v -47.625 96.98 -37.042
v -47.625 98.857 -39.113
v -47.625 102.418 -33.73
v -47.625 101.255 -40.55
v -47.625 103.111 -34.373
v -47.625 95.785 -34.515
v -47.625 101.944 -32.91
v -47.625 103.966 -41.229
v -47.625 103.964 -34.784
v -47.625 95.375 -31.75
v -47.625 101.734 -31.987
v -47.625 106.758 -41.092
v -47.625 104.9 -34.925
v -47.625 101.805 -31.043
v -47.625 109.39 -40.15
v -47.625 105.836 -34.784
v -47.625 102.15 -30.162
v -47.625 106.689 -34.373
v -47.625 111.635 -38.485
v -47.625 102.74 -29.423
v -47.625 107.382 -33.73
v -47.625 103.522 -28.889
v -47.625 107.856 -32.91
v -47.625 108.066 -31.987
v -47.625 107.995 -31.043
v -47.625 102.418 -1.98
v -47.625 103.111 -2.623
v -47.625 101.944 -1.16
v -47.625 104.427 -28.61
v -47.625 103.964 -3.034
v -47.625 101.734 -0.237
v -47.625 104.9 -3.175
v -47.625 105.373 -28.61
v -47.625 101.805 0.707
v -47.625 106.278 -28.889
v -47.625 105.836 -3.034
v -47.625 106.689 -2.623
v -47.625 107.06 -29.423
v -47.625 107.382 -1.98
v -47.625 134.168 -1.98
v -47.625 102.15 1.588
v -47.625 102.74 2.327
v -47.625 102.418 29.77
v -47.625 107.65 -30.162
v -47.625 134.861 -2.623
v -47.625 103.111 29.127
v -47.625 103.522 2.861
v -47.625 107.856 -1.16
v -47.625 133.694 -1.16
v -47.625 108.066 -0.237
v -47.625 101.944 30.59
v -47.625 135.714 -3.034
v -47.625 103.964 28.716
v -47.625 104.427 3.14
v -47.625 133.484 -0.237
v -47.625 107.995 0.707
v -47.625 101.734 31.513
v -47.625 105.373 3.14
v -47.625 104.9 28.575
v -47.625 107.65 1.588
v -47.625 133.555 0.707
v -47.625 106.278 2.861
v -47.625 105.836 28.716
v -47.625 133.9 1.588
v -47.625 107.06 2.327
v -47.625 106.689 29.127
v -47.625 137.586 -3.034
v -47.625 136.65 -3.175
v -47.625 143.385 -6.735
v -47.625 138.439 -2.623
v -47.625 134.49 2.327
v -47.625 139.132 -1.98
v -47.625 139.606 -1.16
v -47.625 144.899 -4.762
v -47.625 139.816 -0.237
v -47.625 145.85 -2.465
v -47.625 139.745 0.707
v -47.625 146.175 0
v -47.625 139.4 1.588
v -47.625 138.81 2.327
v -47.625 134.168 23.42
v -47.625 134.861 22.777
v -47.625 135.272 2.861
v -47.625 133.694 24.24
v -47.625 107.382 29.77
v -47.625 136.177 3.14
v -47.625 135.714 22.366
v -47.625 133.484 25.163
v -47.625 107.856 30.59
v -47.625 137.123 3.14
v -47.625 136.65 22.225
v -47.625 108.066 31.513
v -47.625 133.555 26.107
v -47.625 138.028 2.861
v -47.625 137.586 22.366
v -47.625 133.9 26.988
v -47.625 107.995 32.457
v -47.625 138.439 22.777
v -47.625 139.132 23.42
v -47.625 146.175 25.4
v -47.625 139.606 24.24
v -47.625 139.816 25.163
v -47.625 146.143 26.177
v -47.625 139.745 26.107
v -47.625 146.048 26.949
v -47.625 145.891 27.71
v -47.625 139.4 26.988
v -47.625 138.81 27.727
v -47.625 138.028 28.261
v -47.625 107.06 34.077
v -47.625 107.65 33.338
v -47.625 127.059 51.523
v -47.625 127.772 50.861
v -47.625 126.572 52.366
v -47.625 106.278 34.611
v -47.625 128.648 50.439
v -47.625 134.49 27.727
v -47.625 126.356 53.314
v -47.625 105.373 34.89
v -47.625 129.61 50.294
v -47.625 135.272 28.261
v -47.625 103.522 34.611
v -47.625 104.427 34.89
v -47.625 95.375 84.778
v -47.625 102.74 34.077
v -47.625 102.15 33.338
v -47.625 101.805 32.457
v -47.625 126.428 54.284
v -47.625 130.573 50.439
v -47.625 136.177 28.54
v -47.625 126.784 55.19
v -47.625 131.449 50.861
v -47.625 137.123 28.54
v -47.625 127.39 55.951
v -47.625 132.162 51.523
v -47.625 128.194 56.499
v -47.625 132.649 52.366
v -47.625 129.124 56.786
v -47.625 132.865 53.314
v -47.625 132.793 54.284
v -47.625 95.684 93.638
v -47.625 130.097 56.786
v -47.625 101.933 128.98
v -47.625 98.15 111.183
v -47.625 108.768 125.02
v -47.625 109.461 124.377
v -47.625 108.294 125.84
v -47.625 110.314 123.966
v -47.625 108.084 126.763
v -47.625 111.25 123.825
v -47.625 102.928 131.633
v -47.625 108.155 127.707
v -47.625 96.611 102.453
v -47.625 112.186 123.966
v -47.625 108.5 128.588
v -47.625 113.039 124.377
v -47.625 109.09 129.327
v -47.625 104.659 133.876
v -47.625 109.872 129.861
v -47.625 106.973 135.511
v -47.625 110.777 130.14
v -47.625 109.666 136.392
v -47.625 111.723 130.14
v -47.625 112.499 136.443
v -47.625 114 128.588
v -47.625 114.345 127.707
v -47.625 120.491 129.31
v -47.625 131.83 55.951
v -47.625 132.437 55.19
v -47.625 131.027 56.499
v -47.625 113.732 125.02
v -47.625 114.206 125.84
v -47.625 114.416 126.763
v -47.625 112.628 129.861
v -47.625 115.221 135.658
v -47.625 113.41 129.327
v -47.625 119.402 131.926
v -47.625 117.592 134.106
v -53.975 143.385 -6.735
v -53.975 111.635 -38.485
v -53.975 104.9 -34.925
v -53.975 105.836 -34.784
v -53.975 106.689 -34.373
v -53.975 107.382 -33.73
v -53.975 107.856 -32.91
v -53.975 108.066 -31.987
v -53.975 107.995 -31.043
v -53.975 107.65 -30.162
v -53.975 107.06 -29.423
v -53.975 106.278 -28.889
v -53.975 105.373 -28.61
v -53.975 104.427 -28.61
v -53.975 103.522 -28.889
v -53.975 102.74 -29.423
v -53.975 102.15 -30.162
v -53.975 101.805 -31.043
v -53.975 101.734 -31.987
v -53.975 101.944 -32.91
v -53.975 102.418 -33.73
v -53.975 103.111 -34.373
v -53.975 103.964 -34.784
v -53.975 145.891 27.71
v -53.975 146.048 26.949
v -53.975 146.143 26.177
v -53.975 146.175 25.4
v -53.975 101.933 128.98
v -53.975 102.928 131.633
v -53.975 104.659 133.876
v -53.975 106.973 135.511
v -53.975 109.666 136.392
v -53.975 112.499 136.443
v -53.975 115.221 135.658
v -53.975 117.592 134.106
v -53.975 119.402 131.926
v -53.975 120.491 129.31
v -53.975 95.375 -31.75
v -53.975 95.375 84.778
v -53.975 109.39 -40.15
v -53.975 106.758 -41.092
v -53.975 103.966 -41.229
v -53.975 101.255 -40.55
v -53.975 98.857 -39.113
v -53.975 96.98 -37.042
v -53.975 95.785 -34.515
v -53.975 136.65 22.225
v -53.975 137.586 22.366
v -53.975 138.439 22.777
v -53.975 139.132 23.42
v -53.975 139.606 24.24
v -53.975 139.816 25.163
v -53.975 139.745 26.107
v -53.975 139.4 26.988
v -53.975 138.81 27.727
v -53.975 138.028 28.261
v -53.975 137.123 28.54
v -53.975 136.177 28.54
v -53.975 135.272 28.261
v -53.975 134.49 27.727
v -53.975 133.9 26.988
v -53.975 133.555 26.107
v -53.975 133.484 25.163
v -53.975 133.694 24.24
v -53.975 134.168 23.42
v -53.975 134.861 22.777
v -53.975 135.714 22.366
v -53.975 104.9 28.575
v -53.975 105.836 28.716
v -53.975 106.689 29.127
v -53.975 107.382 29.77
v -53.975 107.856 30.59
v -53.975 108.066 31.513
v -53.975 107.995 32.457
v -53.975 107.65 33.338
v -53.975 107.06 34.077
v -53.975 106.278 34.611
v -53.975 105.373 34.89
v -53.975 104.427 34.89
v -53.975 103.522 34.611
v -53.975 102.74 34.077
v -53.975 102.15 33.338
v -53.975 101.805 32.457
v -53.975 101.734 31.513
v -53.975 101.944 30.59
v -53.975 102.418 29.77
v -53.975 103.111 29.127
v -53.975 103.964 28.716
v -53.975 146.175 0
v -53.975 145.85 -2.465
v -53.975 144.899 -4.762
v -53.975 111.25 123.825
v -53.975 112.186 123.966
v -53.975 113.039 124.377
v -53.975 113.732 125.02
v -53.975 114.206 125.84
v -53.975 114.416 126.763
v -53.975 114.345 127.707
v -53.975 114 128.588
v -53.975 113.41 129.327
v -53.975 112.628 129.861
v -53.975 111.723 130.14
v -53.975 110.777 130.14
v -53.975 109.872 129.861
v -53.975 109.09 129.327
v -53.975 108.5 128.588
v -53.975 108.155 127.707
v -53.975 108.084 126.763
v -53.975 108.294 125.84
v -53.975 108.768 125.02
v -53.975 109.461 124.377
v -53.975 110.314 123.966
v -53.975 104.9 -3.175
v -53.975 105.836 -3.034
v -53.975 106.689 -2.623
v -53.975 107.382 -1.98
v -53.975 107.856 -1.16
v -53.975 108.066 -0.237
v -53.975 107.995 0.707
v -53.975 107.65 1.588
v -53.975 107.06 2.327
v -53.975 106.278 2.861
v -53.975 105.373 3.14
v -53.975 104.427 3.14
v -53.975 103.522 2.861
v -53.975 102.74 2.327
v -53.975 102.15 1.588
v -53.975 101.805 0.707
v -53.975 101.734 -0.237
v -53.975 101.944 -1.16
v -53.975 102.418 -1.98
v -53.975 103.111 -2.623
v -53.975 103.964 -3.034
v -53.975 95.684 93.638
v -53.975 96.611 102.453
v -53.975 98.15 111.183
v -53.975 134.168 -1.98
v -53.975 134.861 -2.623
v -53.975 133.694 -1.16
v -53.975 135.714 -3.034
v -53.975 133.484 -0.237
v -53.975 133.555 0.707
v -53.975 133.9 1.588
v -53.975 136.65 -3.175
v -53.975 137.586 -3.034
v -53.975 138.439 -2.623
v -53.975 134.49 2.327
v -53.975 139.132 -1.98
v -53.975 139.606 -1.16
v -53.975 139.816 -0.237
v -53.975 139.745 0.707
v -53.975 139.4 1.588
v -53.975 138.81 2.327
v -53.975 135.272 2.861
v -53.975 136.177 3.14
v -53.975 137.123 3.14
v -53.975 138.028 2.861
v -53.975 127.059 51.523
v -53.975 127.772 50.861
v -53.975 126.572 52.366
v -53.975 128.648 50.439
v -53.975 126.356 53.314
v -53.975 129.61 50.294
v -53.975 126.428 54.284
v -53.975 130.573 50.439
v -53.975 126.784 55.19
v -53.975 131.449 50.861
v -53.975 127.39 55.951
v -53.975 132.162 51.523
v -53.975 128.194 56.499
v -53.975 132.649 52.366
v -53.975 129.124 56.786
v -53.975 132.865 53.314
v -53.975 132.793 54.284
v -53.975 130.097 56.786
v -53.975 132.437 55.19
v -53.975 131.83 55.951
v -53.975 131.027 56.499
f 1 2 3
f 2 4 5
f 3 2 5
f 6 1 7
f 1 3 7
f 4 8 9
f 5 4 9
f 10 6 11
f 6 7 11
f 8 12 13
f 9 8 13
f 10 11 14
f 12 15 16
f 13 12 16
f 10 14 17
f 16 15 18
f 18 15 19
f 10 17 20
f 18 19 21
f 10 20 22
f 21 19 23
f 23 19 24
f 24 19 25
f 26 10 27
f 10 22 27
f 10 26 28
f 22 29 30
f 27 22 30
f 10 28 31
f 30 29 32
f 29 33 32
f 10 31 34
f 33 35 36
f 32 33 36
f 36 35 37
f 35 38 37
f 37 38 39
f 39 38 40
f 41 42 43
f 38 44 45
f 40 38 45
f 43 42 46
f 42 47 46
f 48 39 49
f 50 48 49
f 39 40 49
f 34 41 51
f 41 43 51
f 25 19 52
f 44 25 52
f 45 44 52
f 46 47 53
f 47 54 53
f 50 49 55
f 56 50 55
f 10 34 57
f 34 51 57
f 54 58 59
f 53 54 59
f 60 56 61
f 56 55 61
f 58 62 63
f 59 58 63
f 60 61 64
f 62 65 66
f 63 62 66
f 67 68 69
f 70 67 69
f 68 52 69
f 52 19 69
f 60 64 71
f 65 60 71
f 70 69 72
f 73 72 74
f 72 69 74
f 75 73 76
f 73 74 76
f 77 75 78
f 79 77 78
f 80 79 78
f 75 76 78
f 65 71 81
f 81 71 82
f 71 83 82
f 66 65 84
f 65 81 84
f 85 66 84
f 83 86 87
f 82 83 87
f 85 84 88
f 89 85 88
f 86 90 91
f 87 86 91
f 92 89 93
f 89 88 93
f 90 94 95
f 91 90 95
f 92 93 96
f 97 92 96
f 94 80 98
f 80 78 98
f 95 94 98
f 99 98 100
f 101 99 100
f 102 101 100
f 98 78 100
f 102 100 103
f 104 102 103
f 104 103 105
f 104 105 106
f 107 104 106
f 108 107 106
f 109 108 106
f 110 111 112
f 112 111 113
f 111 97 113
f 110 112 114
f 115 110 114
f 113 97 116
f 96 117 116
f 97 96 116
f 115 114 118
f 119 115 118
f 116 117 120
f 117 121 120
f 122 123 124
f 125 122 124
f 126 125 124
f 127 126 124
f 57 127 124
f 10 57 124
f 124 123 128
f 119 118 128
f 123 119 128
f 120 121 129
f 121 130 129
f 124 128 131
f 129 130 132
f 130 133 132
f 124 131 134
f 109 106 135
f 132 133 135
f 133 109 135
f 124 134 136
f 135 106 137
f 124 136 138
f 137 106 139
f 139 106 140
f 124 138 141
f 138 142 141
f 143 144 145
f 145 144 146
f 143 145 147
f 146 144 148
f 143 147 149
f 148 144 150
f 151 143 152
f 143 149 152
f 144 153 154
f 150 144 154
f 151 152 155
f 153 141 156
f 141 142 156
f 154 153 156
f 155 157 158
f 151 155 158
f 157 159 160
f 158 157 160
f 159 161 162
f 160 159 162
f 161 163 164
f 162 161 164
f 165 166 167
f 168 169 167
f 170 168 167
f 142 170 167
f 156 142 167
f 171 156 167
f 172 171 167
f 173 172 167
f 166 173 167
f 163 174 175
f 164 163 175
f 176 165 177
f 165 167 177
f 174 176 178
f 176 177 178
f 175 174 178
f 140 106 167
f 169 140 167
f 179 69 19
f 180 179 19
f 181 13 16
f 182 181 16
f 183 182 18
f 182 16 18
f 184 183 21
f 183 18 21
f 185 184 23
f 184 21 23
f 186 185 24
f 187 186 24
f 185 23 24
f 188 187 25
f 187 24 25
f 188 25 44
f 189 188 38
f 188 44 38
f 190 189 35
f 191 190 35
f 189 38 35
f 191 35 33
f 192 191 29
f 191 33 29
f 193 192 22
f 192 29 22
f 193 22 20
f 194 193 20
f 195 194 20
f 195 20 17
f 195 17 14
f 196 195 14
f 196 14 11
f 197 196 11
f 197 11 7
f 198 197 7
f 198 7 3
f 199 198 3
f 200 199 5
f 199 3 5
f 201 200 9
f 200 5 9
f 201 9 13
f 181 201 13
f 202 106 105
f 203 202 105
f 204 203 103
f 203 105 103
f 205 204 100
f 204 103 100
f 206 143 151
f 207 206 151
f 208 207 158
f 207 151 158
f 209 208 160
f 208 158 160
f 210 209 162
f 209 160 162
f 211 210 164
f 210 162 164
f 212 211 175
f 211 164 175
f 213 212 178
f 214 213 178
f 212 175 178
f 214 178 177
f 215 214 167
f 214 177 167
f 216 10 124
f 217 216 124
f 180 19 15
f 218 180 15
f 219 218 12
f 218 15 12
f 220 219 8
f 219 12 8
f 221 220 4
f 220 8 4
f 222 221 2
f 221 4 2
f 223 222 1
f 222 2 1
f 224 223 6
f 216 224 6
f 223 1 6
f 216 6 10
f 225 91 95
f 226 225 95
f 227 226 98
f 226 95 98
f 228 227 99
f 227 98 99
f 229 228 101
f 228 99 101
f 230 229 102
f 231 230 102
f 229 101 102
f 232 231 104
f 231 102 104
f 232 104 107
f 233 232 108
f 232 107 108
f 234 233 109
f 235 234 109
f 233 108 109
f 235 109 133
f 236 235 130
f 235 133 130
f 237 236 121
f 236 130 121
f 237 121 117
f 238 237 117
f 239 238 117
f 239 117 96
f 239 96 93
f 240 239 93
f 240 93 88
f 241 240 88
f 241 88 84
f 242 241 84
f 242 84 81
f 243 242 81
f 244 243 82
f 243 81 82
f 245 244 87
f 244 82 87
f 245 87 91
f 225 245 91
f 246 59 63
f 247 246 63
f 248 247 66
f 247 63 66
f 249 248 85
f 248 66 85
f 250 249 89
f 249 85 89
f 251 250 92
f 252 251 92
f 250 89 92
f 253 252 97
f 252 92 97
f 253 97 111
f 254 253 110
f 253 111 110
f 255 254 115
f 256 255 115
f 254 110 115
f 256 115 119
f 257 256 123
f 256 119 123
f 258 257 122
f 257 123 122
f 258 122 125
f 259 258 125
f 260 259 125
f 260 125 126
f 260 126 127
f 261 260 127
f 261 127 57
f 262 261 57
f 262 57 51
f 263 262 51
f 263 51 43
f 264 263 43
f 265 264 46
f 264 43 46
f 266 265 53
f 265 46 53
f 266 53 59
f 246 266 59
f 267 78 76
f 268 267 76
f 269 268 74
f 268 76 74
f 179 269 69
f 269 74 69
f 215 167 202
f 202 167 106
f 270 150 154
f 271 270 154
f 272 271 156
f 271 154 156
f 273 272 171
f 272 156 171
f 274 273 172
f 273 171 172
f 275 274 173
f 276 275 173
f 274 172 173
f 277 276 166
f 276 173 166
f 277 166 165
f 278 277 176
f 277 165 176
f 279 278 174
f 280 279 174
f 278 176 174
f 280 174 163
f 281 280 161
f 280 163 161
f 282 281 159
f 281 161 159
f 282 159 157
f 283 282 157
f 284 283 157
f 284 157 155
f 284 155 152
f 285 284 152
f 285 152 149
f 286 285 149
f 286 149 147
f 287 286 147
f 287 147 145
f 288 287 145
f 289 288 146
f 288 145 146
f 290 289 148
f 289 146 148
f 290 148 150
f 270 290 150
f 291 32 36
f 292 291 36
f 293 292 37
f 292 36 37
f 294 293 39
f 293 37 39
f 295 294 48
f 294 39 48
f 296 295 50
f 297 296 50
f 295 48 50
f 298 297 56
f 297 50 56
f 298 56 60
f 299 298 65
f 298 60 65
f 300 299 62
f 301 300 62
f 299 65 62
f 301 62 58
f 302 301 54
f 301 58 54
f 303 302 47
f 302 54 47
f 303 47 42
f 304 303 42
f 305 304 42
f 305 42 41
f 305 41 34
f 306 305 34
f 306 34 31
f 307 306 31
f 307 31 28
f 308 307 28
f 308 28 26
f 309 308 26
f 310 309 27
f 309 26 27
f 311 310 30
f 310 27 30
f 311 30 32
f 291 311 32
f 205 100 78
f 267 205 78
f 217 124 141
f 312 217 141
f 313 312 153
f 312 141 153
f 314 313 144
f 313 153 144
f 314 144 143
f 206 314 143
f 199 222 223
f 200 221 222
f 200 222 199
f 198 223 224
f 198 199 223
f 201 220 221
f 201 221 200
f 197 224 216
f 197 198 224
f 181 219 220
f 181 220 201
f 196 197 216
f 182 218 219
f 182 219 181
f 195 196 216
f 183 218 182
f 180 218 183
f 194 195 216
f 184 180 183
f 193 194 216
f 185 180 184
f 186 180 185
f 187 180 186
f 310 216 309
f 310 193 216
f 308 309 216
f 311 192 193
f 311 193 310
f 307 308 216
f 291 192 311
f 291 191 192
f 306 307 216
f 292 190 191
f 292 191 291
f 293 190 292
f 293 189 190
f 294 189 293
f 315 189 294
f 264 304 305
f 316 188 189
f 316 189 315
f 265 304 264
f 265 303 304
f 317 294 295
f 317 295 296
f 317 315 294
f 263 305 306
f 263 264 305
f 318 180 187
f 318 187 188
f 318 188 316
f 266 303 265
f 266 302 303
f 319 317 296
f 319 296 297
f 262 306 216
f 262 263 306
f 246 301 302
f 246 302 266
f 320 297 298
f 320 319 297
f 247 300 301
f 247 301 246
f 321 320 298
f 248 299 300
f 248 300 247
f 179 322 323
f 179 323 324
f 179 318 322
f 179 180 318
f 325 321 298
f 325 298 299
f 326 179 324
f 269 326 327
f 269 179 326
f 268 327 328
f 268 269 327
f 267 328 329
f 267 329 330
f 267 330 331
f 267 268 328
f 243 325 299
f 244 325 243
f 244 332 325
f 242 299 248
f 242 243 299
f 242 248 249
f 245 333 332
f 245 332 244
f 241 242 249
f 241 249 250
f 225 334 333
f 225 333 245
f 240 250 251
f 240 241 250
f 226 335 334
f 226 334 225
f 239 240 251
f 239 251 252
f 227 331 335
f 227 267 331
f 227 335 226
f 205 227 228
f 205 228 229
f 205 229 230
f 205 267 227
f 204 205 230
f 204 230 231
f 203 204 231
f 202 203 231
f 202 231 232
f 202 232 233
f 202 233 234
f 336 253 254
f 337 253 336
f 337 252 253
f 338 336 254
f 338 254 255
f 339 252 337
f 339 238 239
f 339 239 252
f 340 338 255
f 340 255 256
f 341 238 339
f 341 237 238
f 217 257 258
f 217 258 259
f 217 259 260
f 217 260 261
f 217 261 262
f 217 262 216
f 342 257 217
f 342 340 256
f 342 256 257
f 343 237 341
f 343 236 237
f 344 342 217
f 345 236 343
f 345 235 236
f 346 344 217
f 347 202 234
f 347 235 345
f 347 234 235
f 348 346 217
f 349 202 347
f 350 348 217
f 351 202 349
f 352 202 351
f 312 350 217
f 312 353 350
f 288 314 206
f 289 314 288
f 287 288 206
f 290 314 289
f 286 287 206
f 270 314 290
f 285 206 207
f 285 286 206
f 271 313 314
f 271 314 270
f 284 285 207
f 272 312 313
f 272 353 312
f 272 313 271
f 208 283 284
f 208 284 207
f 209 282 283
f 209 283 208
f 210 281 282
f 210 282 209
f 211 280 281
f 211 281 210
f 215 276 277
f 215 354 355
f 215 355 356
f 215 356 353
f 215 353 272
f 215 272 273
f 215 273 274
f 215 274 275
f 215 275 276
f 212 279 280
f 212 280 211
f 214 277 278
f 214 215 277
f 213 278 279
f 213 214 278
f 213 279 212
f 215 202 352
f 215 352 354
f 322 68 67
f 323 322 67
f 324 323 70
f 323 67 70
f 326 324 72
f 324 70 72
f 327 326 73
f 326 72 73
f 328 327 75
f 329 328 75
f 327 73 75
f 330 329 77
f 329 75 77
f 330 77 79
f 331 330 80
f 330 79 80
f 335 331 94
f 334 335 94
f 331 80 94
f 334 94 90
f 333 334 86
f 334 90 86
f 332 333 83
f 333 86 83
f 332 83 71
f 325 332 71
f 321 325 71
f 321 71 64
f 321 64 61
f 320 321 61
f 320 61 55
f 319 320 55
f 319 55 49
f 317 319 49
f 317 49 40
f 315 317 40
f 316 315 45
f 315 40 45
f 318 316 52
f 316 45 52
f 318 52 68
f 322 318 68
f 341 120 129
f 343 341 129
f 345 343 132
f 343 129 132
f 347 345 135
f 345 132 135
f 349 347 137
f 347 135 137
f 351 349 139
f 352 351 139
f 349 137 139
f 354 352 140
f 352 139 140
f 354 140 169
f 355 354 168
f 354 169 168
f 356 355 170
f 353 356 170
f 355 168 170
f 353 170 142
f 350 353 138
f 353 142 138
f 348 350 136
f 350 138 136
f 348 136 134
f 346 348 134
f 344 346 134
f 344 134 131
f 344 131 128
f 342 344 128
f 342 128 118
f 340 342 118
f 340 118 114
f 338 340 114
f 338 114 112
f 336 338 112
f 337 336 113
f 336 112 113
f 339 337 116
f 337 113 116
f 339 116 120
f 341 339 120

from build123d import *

# Parameters (mm, degrees)
BOSS_EXTRUDE1_START = -47.625
SKETCH1_R           = 3.175
SKETCH1_R_2         = 3.2639
BOSS_EXTRUDE1_DEPTH = 6.35


with BuildPart() as part:
    # Sketch1 → Boss-Extrude1 (new body)
    with BuildSketch(Plane(origin=(0, 0, 0), x_dir=(0, 0, -1), z_dir=(1, 0, 0)).offset(BOSS_EXTRUDE1_START)):
        with BuildLine():
            Line((31.75, 95.375), (-84.778478767, 95.375))
            ThreePointArc((-84.778478767, 95.375), (-98.053593602, 96.070719288), (-111.183263501, 98.150254707))
            Line((-111.183263501, 98.150254707), (-128.980358855, 101.933144103))
            ThreePointArc((-128.980358855, 101.933144103), (-136.523496243, 111.080753692), (-129.310151828, 120.490607314))
            Line((-129.310151828, 120.490607314), (-27.710151828, 145.890607314))
            ThreePointArc((-27.710151828, 145.890607314), (-26.563795587, 146.103634477), (-25.4, 146.175))
            Line((-25.4, 146.175), (0, 146.175))
            ThreePointArc((0, 146.175), (3.645059693, 145.449952547), (6.735192091, 143.385192091))
            Line((6.735192091, 143.385192091), (38.485192091, 111.635192091))
            ThreePointArc((38.485192091, 111.635192091), (40.549952547, 101.254940307), (31.75, 95.375))
        make_face()
        with Locations((-127, 111.25)):
            Circle(SKETCH1_R, mode=Mode.SUBTRACT)
        with Locations((-53.558195394, 129.610451151)):
            Circle(SKETCH1_R_2, mode=Mode.SUBTRACT)
        with Locations((0, 136.65)):
            Circle(SKETCH1_R, mode=Mode.SUBTRACT)
        with Locations((-31.75, 104.9)):
            Circle(SKETCH1_R, mode=Mode.SUBTRACT)
        with Locations((0, 104.9)):
            Circle(SKETCH1_R, mode=Mode.SUBTRACT)
        with Locations((31.75, 104.9)):
            Circle(SKETCH1_R, mode=Mode.SUBTRACT)
        with Locations((-25.4, 136.65)):
            Circle(SKETCH1_R, mode=Mode.SUBTRACT)
    extrude(amount=-BOSS_EXTRUDE1_DEPTH)


solid = part.part
